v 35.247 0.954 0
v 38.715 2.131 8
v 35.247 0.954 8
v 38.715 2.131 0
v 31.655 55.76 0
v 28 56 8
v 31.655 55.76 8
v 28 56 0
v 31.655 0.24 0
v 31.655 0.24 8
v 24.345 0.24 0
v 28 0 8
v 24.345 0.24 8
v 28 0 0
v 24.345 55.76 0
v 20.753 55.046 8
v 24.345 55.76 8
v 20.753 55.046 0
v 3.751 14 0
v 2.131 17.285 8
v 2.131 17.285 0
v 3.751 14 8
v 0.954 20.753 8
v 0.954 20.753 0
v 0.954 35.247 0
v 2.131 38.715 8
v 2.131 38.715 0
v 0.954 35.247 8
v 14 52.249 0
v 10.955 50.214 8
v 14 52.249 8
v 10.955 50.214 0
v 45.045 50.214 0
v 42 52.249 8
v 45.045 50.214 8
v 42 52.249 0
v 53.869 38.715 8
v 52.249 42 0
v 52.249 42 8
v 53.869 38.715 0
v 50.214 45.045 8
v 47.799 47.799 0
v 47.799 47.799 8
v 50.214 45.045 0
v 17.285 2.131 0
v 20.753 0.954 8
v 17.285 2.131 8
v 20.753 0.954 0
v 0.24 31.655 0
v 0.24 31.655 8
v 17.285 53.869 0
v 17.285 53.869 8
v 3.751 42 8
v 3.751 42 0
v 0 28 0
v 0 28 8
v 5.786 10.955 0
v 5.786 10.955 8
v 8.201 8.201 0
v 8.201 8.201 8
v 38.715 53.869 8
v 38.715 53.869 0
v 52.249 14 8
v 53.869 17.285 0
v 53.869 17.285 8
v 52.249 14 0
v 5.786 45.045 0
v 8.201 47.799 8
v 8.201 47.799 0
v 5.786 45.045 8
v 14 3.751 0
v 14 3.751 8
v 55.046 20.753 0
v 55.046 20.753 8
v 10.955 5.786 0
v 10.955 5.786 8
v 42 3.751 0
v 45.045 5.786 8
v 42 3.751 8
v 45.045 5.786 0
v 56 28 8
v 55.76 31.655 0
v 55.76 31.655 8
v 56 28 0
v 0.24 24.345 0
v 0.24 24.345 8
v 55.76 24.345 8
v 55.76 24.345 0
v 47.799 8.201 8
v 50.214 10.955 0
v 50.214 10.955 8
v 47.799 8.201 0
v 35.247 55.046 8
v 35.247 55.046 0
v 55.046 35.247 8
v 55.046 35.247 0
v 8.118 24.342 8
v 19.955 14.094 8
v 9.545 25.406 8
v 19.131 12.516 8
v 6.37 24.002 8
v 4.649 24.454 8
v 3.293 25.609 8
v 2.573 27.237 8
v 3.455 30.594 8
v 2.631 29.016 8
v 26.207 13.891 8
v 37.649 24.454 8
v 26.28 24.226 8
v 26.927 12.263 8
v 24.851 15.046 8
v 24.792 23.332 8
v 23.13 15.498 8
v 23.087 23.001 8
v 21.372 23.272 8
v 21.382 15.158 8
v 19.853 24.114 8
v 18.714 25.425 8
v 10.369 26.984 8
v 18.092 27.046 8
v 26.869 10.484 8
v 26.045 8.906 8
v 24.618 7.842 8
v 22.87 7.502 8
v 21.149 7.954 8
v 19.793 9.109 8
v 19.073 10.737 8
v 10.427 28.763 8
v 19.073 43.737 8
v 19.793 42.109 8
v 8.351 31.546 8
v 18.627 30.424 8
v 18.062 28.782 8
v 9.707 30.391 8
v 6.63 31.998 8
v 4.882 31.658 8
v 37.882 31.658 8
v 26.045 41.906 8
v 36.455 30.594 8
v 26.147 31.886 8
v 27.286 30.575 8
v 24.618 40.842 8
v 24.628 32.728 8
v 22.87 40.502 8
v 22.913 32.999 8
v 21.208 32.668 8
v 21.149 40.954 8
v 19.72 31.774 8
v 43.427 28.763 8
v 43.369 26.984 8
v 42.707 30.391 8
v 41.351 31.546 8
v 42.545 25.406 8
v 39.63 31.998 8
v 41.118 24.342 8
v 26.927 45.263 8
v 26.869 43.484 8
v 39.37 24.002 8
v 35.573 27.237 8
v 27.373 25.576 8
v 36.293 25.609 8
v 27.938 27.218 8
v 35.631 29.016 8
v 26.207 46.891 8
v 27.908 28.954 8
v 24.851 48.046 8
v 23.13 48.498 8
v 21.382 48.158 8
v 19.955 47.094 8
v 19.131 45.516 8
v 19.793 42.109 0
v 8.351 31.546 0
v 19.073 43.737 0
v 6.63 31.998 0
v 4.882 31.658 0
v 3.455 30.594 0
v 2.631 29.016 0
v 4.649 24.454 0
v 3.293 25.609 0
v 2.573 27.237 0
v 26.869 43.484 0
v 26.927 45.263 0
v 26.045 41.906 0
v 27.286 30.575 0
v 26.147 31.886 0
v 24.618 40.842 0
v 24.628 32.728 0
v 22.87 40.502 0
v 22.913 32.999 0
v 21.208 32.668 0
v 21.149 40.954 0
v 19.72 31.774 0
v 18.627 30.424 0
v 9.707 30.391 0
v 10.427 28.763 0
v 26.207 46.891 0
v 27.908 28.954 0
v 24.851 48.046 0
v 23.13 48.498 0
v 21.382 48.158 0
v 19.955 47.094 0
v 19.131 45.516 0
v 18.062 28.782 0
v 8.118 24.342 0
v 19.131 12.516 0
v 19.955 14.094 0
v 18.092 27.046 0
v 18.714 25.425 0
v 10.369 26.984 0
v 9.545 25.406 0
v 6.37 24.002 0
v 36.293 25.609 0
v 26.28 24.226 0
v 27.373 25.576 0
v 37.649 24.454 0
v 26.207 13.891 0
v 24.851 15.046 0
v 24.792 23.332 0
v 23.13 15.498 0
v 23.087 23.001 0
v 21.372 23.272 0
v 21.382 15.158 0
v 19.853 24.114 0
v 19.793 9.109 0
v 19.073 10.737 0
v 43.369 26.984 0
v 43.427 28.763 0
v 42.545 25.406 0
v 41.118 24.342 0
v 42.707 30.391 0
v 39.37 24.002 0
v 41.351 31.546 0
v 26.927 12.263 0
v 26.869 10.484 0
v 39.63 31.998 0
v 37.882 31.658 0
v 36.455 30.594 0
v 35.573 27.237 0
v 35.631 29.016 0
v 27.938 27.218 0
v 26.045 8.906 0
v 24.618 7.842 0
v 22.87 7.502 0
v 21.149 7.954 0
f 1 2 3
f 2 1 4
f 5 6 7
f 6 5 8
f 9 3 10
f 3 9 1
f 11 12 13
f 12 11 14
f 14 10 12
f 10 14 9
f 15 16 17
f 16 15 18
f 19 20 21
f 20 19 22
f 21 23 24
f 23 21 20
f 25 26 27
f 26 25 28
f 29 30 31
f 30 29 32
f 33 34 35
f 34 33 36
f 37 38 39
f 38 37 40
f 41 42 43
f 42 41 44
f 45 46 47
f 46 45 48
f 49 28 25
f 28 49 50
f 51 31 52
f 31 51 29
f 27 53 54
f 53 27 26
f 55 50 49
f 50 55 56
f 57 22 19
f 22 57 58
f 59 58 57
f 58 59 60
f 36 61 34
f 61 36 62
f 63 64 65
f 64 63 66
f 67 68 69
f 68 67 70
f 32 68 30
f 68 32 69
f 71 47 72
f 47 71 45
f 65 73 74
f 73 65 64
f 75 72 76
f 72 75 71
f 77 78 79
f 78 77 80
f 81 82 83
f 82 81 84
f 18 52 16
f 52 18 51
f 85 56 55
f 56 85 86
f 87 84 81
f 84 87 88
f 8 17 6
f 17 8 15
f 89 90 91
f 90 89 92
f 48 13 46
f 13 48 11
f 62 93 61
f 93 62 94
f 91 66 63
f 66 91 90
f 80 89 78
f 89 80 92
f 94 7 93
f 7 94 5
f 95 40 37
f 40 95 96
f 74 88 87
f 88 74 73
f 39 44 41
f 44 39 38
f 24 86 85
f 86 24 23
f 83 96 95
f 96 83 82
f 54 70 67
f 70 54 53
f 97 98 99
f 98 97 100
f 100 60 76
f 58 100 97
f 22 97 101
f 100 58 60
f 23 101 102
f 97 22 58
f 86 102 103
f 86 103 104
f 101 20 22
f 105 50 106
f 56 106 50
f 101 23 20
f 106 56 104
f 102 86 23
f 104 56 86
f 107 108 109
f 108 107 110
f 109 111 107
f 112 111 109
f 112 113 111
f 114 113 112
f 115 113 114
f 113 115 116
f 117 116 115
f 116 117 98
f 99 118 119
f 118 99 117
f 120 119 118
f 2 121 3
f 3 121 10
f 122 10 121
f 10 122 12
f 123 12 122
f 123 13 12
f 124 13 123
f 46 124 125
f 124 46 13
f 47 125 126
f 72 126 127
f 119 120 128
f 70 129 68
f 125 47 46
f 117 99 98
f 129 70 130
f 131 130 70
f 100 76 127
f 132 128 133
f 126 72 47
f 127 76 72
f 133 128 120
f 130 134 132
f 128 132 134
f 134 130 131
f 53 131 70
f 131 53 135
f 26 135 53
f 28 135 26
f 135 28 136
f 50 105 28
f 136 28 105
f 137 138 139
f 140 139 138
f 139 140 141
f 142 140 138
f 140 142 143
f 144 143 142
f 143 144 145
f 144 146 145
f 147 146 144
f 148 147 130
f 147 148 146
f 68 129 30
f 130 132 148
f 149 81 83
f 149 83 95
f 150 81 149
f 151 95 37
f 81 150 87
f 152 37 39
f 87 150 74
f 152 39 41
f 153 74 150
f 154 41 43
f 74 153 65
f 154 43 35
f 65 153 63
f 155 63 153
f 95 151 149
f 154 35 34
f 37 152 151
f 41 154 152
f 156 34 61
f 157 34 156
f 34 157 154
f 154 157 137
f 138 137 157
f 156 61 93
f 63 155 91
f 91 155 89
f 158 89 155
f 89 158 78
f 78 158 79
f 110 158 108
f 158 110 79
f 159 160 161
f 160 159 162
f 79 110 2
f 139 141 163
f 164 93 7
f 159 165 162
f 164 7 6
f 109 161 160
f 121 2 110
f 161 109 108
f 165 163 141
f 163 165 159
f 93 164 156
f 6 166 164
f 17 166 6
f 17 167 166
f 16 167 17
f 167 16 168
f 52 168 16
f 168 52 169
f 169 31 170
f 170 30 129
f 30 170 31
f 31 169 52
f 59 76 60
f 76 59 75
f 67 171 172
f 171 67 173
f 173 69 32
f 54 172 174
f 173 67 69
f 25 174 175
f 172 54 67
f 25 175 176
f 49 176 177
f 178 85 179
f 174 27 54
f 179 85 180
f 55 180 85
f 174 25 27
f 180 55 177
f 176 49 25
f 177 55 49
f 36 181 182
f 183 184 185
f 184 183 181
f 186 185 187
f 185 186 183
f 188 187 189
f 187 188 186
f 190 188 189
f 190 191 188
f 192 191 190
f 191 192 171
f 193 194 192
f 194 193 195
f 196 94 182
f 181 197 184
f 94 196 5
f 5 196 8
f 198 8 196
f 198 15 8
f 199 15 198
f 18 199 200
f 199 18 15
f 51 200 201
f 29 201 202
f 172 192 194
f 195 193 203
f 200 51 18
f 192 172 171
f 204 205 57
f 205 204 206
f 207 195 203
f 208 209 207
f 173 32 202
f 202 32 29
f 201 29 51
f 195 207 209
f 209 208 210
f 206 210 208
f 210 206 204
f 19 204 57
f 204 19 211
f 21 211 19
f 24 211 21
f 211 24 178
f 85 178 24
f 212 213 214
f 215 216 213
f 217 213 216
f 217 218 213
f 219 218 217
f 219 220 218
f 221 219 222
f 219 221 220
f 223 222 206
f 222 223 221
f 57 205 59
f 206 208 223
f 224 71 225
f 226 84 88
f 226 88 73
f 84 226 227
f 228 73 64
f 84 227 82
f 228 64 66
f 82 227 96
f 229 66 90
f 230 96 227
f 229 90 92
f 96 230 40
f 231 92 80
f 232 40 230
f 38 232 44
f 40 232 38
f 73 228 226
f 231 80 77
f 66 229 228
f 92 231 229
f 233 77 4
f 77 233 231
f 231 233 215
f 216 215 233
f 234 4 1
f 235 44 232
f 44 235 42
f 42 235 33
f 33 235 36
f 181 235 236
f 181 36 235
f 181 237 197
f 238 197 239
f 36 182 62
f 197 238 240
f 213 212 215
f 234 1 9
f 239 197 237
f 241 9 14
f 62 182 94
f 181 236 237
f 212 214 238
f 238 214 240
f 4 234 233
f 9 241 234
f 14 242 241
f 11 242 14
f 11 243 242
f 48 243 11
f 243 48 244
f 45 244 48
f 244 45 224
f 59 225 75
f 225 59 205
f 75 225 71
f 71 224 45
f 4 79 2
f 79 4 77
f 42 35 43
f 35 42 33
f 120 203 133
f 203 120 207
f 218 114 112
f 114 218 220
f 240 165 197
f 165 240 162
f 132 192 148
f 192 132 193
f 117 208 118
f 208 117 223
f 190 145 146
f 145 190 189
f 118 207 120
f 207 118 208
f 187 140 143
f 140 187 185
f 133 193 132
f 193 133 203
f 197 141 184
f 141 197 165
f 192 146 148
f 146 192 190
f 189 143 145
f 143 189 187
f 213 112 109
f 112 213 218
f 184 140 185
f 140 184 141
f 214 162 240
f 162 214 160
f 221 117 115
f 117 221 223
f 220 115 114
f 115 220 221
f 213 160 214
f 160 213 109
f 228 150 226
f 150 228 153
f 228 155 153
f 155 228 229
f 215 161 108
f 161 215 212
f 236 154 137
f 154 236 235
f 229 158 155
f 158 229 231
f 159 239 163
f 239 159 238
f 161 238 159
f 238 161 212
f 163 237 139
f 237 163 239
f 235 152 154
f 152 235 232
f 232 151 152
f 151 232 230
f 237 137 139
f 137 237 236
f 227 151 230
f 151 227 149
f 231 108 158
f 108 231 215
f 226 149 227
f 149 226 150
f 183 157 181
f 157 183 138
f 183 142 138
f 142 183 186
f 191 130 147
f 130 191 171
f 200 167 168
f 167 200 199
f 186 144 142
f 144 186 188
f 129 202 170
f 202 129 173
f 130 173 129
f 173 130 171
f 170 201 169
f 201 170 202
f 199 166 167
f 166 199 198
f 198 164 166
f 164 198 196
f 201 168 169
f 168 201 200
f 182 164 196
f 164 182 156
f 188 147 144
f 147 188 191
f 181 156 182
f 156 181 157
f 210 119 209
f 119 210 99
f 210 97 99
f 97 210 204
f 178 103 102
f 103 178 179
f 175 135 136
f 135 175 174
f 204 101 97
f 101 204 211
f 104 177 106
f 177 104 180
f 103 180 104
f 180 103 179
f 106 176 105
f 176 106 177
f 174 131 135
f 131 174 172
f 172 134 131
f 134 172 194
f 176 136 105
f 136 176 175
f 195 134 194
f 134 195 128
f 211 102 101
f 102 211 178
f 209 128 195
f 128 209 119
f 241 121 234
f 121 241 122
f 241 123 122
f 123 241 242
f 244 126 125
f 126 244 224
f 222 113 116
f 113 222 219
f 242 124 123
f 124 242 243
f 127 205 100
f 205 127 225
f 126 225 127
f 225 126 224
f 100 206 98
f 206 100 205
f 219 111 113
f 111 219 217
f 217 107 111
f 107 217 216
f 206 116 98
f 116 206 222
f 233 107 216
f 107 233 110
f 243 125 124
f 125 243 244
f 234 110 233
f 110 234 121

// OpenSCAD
$fn = 32;

// ----------------------------------------------------------------------
// Cam plate: eccentric cam, base R28
// ----------------------------------------------------------------------

// --- parameters (mm) ---
base_r = 28;              // base circle radius
lobe_h = 10;              // cam lobe rise
bore_r = 5;               // shaft bore radius
plate_t = 8;              // plate thickness, Z (extrusion height)
ecc = 5;                  // disc eccentricity
ring_r = 16.5;            // lightening ring radius
bolt_r = 4;               // lightening hole radius
fit_tol = 0.1;            // declared fit tolerance (prompt contract)
free_tol = 0.5;           // declared free tolerance (prompt contract)

profile = [[56, 28], [55.76, 31.655], [55.046, 35.247], [53.869, 38.715], [52.249, 42], [50.214, 45.045], [47.799, 47.799], [45.045, 50.214], [42, 52.249], [38.715, 53.869], [35.247, 55.046], [31.655, 55.76], [28, 56], [24.345, 55.76], [20.753, 55.046], [17.285, 53.869], [14, 52.249], [10.955, 50.214], [8.201, 47.799], [5.786, 45.045], [3.751, 42], [2.131, 38.715], [0.954, 35.247], [0.24, 31.655], [0, 28], [0.24, 24.345], [0.954, 20.753], [2.131, 17.285], [3.751, 14], [5.786, 10.955], [8.201, 8.201], [10.955, 5.786], [14, 3.751], [17.285, 2.131], [20.753, 0.954], [24.345, 0.24], [28, 0], [31.655, 0.24], [35.247, 0.954], [38.715, 2.131], [42, 3.751], [45.045, 5.786], [47.799, 8.201], [50.214, 10.955], [52.249, 14], [53.869, 17.285], [55.046, 20.753], [55.76, 24.345]];  // primary outline, 48 points, counter clockwise
void_1 = [[27.908, 28.954], [27.286, 30.575], [26.147, 31.886], [24.628, 32.728], [22.913, 32.999], [21.208, 32.668], [19.72, 31.774], [18.627, 30.424], [18.062, 28.782], [18.092, 27.046], [18.714, 25.425], [19.853, 24.114], [21.372, 23.272], [23.087, 23.001], [24.792, 23.332], [26.28, 24.226], [27.373, 25.576], [27.938, 27.218]];  // shaft bore, 18 points
void_2 = [[43.427, 28.763], [42.707, 30.391], [41.351, 31.546], [39.63, 31.998], [37.882, 31.658], [36.455, 30.594], [35.631, 29.016], [35.573, 27.237], [36.293, 25.609], [37.649, 24.454], [39.37, 24.002], [41.118, 24.342], [42.545, 25.406], [43.369, 26.984]];  // lightening hole 1, 14 points
void_3 = [[26.927, 45.263], [26.207, 46.891], [24.851, 48.046], [23.13, 48.498], [21.382, 48.158], [19.955, 47.094], [19.131, 45.516], [19.073, 43.737], [19.793, 42.109], [21.149, 40.954], [22.87, 40.502], [24.618, 40.842], [26.045, 41.906], [26.869, 43.484]];  // lightening hole 2, 14 points
void_4 = [[10.427, 28.763], [9.707, 30.391], [8.351, 31.546], [6.63, 31.998], [4.882, 31.658], [3.455, 30.594], [2.631, 29.016], [2.573, 27.237], [3.293, 25.609], [4.649, 24.454], [6.37, 24.002], [8.118, 24.342], [9.545, 25.406], [10.369, 26.984]];  // lightening hole 3, 14 points
void_5 = [[26.927, 12.263], [26.207, 13.891], [24.851, 15.046], [23.13, 15.498], [21.382, 15.158], [19.955, 14.094], [19.131, 12.516], [19.073, 10.737], [19.793, 9.109], [21.149, 7.954], [22.87, 7.502], [24.618, 7.842], [26.045, 8.906], [26.869, 10.484]];  // lightening hole 4, 14 points

// --- the one profile operation ---
difference() {
  linear_extrude(height = plate_t) polygon(points = profile);
  translate([0, 0, -1])
    linear_extrude(height = plate_t + 2) polygon(points = void_1);
  translate([0, 0, -1])
    linear_extrude(height = plate_t + 2) polygon(points = void_2);
  translate([0, 0, -1])
    linear_extrude(height = plate_t + 2) polygon(points = void_3);
  translate([0, 0, -1])
    linear_extrude(height = plate_t + 2) polygon(points = void_4);
  translate([0, 0, -1])
    linear_extrude(height = plate_t + 2) polygon(points = void_5);
}
